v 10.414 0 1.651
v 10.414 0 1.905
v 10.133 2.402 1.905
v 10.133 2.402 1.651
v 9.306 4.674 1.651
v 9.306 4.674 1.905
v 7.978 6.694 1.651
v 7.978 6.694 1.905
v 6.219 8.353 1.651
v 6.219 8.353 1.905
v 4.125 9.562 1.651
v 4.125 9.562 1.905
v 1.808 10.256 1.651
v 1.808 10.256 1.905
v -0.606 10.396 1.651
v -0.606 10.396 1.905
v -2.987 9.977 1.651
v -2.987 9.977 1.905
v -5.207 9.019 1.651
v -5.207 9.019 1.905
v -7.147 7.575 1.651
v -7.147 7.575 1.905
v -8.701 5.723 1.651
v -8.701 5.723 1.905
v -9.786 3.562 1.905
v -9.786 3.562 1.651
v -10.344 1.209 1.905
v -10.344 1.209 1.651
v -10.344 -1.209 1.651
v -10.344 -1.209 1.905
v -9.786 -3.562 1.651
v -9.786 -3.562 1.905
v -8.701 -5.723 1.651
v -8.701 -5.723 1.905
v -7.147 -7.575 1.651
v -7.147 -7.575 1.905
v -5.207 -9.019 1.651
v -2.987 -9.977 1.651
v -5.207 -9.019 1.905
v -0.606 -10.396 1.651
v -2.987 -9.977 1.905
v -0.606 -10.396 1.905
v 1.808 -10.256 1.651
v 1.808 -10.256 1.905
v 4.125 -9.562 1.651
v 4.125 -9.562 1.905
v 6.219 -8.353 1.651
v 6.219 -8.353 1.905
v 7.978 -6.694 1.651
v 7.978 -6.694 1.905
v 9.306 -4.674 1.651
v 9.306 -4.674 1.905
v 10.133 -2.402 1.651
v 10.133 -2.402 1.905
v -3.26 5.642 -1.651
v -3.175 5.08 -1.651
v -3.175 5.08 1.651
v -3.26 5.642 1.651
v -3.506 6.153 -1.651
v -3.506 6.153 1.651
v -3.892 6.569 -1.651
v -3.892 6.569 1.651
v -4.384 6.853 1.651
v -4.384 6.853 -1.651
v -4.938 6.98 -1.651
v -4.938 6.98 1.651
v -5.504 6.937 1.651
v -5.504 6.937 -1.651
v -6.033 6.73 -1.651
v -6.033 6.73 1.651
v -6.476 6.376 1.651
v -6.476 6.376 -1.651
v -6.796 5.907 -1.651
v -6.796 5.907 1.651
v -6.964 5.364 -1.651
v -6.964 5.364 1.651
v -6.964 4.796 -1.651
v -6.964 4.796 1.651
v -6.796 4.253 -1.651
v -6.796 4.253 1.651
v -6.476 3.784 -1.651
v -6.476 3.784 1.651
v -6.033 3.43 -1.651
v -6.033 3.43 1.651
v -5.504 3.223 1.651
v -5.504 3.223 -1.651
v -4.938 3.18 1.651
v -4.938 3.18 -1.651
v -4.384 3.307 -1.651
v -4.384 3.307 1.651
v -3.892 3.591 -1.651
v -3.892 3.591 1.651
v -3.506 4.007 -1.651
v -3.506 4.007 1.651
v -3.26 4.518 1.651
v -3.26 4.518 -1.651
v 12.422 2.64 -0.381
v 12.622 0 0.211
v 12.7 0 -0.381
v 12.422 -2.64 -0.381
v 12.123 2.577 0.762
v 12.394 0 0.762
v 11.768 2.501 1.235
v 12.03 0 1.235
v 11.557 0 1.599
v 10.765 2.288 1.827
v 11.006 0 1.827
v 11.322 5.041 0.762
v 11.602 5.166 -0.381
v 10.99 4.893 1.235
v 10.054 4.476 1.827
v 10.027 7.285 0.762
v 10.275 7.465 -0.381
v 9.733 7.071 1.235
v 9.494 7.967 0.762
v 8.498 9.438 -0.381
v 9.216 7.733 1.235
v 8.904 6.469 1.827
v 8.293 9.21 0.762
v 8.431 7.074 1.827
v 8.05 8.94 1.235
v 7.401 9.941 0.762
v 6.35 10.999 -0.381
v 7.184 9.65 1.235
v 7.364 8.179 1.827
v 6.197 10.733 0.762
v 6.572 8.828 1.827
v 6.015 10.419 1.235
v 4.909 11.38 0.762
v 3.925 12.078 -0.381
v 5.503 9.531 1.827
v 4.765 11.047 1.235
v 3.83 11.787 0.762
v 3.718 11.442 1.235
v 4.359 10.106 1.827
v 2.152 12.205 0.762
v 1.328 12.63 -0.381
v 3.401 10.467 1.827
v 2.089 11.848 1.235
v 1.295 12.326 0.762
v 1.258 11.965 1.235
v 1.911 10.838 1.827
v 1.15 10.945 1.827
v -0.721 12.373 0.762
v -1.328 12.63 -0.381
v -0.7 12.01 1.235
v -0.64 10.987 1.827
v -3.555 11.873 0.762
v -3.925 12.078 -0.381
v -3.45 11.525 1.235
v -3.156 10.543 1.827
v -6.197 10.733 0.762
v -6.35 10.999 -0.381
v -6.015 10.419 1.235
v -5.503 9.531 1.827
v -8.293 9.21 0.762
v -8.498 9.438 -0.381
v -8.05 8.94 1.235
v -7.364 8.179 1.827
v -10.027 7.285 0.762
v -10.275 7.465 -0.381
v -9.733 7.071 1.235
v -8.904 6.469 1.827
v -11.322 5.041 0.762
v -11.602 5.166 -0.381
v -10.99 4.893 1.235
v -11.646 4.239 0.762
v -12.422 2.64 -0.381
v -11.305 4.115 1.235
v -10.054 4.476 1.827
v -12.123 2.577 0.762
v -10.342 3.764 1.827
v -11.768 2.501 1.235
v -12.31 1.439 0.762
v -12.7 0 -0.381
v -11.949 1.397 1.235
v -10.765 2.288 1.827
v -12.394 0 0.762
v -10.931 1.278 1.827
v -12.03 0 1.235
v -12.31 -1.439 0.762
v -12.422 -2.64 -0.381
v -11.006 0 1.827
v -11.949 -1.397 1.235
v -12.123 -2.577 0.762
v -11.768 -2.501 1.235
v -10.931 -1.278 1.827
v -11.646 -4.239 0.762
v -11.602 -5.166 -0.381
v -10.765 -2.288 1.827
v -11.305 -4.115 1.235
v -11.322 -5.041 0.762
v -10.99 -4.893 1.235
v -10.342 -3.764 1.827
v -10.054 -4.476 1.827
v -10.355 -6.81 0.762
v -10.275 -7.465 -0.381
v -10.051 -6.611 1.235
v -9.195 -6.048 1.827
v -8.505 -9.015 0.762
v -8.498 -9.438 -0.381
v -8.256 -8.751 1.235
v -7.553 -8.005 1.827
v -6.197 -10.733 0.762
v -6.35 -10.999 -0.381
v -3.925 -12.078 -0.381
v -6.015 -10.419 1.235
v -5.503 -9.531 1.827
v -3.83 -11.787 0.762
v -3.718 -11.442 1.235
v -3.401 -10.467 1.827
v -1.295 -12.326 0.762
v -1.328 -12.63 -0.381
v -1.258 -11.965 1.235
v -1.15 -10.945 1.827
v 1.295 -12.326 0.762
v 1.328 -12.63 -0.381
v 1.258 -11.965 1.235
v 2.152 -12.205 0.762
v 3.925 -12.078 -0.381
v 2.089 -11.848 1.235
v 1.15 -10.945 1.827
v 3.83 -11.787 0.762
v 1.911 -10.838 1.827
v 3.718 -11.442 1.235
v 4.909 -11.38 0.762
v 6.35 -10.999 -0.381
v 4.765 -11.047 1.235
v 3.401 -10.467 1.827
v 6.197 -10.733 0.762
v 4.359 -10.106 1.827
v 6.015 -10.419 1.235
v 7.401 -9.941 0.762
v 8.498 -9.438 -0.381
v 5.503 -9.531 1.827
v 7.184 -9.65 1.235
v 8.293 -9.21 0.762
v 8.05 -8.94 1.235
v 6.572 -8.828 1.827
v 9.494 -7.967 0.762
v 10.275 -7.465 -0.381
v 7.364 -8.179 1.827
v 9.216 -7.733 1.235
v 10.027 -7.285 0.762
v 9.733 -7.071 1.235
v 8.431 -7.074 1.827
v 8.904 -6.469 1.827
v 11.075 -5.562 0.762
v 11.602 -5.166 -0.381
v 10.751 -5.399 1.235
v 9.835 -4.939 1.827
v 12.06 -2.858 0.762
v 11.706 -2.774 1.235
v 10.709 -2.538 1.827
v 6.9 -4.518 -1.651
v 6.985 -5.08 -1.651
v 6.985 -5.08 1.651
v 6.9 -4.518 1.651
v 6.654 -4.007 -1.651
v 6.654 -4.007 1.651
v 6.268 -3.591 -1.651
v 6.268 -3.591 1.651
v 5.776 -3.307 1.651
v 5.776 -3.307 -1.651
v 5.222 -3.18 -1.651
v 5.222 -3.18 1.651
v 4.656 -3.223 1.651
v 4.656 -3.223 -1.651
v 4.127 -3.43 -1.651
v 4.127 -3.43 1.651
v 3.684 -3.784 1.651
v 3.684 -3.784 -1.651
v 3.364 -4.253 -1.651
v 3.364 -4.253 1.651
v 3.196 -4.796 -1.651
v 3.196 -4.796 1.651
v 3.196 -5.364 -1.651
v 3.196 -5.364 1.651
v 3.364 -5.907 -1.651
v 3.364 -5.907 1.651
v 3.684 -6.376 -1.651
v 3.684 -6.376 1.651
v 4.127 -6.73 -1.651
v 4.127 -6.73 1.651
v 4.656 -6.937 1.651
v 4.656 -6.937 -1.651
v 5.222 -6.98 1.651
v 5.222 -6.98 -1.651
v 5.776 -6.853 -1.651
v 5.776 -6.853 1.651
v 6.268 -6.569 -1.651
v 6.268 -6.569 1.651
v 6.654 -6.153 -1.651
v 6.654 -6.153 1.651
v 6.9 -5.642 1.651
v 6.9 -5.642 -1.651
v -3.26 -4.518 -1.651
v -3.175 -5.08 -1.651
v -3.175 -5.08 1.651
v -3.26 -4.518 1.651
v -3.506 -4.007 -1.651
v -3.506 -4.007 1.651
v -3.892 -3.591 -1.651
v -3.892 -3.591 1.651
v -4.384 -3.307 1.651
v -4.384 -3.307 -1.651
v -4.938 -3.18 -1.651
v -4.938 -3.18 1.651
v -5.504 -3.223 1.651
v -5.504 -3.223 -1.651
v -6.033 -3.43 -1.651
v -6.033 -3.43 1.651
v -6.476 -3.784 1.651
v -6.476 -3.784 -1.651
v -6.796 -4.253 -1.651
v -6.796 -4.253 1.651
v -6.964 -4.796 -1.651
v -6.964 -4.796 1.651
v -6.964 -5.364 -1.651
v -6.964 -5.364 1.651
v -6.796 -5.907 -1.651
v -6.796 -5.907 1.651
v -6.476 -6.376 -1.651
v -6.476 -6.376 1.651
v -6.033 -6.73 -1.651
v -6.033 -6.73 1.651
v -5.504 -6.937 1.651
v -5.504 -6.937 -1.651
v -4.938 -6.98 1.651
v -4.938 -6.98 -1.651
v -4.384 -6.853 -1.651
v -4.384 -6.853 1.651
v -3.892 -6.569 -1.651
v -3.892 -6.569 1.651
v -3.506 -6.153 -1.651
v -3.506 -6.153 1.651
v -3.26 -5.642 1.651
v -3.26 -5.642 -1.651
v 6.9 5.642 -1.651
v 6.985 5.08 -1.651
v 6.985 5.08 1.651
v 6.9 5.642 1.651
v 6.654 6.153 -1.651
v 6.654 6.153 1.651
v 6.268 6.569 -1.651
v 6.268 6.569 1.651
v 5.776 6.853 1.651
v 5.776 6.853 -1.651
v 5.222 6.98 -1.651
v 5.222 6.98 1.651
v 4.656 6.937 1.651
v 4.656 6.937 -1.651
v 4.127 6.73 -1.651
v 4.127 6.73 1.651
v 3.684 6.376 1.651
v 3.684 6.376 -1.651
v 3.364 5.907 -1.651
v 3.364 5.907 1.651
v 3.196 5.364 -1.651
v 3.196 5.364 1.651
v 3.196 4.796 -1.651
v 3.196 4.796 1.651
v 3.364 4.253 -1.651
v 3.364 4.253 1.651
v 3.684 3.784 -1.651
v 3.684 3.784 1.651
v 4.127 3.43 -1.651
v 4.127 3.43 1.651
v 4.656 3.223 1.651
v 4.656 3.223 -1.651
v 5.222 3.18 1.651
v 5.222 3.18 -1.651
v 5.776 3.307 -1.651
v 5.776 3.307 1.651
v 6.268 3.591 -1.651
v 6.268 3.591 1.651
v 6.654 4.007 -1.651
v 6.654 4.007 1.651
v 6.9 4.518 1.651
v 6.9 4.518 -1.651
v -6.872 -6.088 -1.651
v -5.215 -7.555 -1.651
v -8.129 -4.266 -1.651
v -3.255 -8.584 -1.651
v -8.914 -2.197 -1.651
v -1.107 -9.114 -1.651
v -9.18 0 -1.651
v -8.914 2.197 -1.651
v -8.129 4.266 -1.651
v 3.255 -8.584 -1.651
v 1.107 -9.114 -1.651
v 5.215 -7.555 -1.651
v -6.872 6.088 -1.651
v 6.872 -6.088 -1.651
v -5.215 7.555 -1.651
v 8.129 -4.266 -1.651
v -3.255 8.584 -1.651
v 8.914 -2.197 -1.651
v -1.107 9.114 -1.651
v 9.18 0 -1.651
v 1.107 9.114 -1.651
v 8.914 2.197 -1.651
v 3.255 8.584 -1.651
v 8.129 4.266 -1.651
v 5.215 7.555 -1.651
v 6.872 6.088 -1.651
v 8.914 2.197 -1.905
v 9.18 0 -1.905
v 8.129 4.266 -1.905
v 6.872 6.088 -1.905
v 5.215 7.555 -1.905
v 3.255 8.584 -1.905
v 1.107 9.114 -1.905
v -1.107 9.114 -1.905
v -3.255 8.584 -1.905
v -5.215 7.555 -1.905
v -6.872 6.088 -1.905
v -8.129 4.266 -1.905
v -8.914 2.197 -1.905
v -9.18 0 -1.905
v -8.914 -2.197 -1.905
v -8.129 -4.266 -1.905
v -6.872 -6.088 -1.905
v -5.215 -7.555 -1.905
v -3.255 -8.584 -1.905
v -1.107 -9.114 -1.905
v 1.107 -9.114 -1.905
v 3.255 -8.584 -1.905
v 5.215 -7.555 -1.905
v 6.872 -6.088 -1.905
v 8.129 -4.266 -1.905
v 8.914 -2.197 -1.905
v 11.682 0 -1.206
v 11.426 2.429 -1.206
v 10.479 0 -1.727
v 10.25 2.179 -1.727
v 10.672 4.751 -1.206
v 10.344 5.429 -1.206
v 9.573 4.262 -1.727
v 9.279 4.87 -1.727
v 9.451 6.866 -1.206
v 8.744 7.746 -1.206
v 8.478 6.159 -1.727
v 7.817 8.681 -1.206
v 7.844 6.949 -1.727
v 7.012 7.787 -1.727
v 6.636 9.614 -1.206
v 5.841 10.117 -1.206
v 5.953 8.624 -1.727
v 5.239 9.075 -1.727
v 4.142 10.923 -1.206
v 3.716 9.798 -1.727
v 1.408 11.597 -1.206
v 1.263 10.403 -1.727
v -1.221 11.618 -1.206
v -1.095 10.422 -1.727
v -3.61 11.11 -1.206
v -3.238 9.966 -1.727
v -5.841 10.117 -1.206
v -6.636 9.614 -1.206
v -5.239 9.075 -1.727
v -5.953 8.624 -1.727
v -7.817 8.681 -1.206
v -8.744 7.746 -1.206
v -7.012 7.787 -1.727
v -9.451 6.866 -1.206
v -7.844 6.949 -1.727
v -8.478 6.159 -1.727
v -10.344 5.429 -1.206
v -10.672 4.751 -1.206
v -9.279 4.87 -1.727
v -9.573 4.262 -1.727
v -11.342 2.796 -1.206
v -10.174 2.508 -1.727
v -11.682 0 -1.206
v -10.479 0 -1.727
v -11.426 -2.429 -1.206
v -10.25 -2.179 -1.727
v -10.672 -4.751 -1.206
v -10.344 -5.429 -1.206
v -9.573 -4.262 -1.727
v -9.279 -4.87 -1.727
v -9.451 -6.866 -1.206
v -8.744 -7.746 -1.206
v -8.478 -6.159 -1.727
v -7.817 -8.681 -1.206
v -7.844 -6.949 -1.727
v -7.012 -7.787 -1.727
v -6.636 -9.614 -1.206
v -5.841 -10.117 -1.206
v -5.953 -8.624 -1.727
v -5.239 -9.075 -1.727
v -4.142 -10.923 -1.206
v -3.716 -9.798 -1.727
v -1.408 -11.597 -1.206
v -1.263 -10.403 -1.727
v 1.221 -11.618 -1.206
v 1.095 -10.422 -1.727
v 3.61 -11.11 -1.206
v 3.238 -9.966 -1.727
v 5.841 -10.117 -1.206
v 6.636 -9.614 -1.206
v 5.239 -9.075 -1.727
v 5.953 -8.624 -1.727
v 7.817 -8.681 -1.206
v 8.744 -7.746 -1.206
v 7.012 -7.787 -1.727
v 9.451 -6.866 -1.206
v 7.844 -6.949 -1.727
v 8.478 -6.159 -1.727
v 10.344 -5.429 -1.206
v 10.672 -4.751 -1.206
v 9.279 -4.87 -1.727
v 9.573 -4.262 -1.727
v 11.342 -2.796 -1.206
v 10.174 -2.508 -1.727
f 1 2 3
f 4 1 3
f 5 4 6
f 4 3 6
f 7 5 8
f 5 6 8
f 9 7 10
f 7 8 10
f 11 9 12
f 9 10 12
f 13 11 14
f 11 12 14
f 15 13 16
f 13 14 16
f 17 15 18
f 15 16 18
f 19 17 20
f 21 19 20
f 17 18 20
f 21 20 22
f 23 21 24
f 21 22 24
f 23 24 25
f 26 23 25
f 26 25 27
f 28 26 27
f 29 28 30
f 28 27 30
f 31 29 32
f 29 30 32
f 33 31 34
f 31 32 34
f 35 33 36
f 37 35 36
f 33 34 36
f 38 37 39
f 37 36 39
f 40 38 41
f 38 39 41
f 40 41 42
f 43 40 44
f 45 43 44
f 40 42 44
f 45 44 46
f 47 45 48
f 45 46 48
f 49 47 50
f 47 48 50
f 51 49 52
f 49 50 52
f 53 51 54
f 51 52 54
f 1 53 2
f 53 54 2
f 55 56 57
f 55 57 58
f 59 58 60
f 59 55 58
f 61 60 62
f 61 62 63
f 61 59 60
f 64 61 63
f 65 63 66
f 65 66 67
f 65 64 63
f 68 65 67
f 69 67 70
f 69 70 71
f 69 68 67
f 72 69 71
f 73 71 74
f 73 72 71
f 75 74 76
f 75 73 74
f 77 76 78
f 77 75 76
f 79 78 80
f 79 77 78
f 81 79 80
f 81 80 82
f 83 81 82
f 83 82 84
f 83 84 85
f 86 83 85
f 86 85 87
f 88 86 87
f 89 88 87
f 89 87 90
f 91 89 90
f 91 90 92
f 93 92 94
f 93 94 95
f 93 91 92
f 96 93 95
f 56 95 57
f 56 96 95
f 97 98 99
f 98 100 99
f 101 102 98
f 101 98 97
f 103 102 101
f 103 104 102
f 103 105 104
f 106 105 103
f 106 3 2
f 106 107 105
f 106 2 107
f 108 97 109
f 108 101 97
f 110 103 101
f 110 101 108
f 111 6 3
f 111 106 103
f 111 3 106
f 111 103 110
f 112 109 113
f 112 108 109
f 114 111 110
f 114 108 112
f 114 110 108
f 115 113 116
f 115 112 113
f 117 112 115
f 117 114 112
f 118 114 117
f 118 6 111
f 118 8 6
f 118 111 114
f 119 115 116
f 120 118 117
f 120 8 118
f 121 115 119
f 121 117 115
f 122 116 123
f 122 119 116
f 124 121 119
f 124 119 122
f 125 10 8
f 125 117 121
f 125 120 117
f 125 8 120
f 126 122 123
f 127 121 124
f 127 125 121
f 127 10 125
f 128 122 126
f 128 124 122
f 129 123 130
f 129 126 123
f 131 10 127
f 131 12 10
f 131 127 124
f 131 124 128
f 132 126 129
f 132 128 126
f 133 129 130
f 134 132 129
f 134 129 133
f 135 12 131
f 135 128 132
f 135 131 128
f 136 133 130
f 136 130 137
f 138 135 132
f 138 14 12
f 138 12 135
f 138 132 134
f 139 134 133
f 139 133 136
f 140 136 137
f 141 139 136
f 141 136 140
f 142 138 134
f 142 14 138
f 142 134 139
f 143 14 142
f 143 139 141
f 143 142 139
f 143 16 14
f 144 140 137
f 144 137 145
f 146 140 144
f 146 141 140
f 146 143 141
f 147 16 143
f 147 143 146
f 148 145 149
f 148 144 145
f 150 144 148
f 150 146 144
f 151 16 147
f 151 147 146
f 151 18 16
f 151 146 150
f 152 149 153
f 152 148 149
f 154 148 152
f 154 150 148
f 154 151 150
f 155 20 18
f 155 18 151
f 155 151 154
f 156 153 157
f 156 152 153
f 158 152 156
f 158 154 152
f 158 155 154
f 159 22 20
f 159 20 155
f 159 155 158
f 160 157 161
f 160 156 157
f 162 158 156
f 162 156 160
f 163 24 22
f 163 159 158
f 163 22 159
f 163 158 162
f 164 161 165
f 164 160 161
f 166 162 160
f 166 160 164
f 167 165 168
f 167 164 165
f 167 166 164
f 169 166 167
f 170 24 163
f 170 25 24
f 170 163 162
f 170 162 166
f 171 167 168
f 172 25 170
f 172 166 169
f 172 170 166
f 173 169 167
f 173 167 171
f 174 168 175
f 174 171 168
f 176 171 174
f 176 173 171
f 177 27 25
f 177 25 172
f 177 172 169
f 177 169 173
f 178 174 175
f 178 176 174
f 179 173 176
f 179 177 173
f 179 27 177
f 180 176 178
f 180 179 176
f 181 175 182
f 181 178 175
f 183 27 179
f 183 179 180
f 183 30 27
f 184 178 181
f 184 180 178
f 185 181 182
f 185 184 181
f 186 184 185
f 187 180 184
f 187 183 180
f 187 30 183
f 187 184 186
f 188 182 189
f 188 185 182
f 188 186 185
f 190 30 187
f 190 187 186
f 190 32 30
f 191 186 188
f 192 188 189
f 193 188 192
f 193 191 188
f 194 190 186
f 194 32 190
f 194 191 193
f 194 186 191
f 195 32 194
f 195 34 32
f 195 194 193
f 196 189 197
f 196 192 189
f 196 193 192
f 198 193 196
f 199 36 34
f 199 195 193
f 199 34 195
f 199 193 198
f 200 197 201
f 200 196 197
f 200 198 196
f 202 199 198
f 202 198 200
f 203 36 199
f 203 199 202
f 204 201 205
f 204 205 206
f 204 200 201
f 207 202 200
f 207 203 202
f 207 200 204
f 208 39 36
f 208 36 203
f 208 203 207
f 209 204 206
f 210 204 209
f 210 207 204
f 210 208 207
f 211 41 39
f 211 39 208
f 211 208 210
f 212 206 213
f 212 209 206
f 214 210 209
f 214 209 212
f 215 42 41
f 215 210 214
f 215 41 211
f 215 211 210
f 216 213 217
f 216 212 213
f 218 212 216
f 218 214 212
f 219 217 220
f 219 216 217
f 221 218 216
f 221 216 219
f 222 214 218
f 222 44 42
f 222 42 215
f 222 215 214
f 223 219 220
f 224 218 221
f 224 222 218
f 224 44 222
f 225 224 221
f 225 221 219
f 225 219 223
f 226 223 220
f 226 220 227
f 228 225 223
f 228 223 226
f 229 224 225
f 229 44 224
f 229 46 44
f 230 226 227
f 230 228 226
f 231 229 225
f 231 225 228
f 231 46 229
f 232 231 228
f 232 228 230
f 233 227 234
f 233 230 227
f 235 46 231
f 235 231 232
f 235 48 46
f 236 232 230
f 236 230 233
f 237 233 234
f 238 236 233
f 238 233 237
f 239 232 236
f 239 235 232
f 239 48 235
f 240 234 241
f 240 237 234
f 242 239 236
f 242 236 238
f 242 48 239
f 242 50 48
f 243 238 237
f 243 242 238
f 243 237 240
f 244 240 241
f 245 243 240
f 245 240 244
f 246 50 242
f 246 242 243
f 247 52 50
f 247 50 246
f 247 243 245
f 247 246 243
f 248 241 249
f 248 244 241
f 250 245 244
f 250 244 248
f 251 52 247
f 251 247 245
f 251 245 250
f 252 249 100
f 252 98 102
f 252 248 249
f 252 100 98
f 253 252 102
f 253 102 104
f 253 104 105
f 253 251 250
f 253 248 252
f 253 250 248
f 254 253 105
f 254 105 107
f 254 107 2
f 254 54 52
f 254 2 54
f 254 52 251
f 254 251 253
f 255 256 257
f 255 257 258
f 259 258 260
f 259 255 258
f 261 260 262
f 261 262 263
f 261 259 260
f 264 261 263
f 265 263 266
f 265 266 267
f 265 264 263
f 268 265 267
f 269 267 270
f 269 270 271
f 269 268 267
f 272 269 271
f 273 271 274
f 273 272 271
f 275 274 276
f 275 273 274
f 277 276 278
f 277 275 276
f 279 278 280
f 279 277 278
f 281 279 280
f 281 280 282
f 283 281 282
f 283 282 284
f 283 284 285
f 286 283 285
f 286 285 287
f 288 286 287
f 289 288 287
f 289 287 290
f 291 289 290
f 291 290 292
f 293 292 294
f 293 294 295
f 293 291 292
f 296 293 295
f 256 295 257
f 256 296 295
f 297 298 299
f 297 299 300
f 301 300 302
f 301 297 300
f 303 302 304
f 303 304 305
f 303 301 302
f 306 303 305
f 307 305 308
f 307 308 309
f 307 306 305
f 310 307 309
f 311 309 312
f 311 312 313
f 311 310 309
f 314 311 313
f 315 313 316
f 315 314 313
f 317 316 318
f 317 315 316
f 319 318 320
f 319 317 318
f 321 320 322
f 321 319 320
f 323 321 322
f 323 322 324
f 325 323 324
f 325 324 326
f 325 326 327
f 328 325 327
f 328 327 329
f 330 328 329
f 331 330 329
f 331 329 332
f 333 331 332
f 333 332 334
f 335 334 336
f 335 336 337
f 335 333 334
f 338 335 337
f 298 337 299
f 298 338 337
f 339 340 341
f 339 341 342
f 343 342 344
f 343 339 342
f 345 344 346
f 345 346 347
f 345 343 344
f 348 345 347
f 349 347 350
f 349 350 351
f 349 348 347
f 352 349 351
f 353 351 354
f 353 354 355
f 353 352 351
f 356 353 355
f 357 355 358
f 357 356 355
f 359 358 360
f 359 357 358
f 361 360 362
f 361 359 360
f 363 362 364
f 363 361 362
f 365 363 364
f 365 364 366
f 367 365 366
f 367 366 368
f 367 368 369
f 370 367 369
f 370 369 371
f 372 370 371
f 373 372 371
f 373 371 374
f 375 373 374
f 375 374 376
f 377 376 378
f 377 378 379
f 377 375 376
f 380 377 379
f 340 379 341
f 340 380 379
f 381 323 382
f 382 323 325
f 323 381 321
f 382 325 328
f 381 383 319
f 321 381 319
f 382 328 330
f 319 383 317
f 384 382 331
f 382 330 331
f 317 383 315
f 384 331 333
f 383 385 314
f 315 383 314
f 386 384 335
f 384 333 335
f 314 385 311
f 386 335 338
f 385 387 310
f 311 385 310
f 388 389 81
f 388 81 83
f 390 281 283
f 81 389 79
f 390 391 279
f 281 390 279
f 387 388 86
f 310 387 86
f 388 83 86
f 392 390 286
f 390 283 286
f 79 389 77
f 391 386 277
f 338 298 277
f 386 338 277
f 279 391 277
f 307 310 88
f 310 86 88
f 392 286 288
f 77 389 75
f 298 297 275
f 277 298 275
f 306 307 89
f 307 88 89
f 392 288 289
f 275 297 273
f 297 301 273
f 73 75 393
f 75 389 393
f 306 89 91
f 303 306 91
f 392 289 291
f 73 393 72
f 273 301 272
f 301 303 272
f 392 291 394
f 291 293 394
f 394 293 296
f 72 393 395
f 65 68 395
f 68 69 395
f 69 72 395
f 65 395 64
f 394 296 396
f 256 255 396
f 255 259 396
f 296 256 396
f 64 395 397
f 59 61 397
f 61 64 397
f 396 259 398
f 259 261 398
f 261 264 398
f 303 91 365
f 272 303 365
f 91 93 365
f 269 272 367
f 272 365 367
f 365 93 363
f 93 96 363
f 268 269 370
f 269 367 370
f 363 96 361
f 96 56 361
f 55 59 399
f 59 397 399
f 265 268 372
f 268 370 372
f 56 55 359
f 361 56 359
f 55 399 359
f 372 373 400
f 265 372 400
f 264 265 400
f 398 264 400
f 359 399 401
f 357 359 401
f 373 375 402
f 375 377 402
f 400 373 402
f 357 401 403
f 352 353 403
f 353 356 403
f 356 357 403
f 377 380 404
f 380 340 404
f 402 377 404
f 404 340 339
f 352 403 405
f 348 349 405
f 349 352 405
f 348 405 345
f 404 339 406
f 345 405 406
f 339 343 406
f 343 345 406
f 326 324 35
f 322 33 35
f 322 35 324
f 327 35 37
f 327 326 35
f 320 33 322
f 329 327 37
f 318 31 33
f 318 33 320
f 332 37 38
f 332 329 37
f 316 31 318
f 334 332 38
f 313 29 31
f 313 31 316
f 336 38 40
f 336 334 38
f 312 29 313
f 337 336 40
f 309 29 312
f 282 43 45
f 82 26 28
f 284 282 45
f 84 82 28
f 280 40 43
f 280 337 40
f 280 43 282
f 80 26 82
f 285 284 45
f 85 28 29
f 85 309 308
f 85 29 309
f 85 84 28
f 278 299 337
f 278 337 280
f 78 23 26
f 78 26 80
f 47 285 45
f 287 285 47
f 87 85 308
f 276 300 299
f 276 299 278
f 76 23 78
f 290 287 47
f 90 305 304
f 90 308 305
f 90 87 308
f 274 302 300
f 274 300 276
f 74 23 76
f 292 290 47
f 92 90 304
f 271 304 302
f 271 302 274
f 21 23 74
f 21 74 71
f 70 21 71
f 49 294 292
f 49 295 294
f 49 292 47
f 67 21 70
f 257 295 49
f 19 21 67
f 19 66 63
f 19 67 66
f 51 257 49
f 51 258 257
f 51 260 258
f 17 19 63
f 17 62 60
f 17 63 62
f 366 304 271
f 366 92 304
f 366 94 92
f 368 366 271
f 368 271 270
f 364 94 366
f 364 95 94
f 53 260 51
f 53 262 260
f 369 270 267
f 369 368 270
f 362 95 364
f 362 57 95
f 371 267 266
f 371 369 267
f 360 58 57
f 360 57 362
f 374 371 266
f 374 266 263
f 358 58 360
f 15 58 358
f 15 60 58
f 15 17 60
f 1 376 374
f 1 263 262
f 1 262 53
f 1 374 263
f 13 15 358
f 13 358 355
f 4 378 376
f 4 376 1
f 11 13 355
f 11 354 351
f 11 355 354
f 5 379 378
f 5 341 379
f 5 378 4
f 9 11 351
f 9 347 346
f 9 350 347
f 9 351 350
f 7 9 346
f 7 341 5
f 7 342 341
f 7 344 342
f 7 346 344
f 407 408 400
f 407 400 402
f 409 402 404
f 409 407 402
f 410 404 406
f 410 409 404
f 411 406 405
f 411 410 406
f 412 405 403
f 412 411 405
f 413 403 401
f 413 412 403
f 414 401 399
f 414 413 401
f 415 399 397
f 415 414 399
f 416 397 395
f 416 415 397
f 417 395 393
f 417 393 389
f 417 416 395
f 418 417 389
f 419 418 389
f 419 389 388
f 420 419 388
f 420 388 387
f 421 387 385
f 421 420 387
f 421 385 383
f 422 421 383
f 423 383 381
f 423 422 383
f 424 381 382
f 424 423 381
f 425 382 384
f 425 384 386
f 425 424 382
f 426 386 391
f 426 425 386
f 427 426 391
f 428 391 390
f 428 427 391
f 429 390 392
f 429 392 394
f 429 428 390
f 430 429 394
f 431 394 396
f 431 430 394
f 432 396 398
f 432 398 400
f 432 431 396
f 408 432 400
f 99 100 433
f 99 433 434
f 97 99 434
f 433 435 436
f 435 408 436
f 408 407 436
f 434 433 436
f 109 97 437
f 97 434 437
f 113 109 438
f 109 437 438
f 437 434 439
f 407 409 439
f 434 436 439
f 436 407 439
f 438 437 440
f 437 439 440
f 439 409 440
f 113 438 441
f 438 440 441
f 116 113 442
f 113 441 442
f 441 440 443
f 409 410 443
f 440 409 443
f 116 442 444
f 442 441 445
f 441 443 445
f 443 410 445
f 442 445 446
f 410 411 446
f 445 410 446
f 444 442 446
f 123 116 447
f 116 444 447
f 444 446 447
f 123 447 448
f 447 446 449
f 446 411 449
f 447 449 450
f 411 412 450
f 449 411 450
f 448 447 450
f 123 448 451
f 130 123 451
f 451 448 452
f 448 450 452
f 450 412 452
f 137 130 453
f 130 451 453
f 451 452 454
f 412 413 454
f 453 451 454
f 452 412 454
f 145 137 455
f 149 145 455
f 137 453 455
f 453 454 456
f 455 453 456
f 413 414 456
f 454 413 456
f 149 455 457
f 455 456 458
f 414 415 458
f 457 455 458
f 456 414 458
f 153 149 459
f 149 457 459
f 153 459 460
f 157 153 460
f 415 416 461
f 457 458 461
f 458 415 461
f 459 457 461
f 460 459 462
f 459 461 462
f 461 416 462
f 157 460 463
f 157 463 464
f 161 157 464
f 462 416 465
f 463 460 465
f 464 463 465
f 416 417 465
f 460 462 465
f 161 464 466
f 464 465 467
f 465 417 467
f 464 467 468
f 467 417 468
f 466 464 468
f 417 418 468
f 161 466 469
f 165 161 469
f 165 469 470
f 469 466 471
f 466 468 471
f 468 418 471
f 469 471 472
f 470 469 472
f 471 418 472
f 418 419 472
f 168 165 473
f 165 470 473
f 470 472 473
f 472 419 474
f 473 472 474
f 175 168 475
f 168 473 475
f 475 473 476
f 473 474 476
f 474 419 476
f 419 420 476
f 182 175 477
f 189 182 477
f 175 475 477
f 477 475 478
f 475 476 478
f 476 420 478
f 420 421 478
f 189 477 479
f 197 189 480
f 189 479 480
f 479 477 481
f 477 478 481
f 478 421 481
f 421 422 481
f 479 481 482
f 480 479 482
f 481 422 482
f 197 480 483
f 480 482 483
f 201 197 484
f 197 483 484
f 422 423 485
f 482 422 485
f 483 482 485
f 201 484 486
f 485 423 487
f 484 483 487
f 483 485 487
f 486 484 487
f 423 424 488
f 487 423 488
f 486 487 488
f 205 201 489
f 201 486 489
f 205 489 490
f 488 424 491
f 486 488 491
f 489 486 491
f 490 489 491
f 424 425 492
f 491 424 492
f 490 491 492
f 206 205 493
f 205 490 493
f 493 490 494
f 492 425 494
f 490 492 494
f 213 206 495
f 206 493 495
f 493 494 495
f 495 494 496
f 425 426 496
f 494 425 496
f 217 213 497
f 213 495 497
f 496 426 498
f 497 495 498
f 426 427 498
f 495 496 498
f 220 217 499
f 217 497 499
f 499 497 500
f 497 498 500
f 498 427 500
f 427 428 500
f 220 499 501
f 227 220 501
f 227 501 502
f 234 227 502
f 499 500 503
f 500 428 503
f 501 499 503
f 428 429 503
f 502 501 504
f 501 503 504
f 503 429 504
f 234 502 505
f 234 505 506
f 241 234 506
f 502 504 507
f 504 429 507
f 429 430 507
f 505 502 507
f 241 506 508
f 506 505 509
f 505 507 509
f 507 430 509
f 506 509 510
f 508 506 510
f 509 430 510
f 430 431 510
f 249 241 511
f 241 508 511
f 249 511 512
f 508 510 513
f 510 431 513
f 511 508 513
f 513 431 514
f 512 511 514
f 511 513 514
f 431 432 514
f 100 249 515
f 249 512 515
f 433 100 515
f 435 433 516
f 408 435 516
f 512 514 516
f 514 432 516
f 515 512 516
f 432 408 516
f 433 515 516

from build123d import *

# Parameters (mm, degrees)
F0_R     = 12.7
F0_R_2   = 1.905
F1_DEPTH = 1.905
F2_R     = 2.286
F4_DEPTH = 0.254
F5_DEPTH = 0.254


# Not quite as in the source:
# - a fillet or chamfer that OpenCascade refuses, or shapes differently, is made with other operations: its cross-section is extruded or revolved along the edge and cut away or added


with BuildPart() as f1:
    # F0 (on Top) → F1 (new body, symmetric)
    with BuildSketch(Plane.XY):
        Circle(F0_R)
        with Locations((-5.08, -5.08)):
            Circle(F0_R_2, mode=Mode.SUBTRACT)
        with Locations((5.08, -5.08)):
            Circle(F0_R_2, mode=Mode.SUBTRACT)
        with Locations((-5.08, 5.08)):
            Circle(F0_R_2, mode=Mode.SUBTRACT)
        with Locations((5.08, 5.08)):
            Circle(F0_R_2, mode=Mode.SUBTRACT)
    extrude(amount=F1_DEPTH, both=True)

    # F2
    f2_edges = [f1.edges().sort_by_distance(p)[0] for p in [
        (-12.7, 0, 1.905),
    ]]
    fillet(f2_edges, radius=F2_R)

    # F3: fillet of radius 4.826 on 1 edges, made by hand

    # F3_s1 → F3_t2 (revolve, cut)
    with BuildSketch(Plane.XZ):
        with BuildLine():
            ThreePointArc((12.7, -0.381), (11.0981307056, -1.5076413266), (9.180472759, -1.905))
            Line((9.180472759, -1.905), (12.7, -1.905))
            Line((12.7, -1.905), (12.7, -0.381))
        make_face()
    revolve(axis=Axis((0, 0, -1.905), (0, 0, 1)), mode=Mode.SUBTRACT)

    # F4 (cut): a face of the model
    f4_faces = [f1.faces().sort_by_distance(p)[0] for p in [
        (0, 0, 1.905),
    ]]
    extrude(f4_faces, amount=-F4_DEPTH, mode=Mode.SUBTRACT)

    # F5 (cut): a face of the model
    f5_faces = [f1.faces().sort_by_distance(p)[0] for p in [
        (0, 0, -1.905),
    ]]
    extrude(f5_faces, amount=-F5_DEPTH, mode=Mode.SUBTRACT)


solid = f1.part
